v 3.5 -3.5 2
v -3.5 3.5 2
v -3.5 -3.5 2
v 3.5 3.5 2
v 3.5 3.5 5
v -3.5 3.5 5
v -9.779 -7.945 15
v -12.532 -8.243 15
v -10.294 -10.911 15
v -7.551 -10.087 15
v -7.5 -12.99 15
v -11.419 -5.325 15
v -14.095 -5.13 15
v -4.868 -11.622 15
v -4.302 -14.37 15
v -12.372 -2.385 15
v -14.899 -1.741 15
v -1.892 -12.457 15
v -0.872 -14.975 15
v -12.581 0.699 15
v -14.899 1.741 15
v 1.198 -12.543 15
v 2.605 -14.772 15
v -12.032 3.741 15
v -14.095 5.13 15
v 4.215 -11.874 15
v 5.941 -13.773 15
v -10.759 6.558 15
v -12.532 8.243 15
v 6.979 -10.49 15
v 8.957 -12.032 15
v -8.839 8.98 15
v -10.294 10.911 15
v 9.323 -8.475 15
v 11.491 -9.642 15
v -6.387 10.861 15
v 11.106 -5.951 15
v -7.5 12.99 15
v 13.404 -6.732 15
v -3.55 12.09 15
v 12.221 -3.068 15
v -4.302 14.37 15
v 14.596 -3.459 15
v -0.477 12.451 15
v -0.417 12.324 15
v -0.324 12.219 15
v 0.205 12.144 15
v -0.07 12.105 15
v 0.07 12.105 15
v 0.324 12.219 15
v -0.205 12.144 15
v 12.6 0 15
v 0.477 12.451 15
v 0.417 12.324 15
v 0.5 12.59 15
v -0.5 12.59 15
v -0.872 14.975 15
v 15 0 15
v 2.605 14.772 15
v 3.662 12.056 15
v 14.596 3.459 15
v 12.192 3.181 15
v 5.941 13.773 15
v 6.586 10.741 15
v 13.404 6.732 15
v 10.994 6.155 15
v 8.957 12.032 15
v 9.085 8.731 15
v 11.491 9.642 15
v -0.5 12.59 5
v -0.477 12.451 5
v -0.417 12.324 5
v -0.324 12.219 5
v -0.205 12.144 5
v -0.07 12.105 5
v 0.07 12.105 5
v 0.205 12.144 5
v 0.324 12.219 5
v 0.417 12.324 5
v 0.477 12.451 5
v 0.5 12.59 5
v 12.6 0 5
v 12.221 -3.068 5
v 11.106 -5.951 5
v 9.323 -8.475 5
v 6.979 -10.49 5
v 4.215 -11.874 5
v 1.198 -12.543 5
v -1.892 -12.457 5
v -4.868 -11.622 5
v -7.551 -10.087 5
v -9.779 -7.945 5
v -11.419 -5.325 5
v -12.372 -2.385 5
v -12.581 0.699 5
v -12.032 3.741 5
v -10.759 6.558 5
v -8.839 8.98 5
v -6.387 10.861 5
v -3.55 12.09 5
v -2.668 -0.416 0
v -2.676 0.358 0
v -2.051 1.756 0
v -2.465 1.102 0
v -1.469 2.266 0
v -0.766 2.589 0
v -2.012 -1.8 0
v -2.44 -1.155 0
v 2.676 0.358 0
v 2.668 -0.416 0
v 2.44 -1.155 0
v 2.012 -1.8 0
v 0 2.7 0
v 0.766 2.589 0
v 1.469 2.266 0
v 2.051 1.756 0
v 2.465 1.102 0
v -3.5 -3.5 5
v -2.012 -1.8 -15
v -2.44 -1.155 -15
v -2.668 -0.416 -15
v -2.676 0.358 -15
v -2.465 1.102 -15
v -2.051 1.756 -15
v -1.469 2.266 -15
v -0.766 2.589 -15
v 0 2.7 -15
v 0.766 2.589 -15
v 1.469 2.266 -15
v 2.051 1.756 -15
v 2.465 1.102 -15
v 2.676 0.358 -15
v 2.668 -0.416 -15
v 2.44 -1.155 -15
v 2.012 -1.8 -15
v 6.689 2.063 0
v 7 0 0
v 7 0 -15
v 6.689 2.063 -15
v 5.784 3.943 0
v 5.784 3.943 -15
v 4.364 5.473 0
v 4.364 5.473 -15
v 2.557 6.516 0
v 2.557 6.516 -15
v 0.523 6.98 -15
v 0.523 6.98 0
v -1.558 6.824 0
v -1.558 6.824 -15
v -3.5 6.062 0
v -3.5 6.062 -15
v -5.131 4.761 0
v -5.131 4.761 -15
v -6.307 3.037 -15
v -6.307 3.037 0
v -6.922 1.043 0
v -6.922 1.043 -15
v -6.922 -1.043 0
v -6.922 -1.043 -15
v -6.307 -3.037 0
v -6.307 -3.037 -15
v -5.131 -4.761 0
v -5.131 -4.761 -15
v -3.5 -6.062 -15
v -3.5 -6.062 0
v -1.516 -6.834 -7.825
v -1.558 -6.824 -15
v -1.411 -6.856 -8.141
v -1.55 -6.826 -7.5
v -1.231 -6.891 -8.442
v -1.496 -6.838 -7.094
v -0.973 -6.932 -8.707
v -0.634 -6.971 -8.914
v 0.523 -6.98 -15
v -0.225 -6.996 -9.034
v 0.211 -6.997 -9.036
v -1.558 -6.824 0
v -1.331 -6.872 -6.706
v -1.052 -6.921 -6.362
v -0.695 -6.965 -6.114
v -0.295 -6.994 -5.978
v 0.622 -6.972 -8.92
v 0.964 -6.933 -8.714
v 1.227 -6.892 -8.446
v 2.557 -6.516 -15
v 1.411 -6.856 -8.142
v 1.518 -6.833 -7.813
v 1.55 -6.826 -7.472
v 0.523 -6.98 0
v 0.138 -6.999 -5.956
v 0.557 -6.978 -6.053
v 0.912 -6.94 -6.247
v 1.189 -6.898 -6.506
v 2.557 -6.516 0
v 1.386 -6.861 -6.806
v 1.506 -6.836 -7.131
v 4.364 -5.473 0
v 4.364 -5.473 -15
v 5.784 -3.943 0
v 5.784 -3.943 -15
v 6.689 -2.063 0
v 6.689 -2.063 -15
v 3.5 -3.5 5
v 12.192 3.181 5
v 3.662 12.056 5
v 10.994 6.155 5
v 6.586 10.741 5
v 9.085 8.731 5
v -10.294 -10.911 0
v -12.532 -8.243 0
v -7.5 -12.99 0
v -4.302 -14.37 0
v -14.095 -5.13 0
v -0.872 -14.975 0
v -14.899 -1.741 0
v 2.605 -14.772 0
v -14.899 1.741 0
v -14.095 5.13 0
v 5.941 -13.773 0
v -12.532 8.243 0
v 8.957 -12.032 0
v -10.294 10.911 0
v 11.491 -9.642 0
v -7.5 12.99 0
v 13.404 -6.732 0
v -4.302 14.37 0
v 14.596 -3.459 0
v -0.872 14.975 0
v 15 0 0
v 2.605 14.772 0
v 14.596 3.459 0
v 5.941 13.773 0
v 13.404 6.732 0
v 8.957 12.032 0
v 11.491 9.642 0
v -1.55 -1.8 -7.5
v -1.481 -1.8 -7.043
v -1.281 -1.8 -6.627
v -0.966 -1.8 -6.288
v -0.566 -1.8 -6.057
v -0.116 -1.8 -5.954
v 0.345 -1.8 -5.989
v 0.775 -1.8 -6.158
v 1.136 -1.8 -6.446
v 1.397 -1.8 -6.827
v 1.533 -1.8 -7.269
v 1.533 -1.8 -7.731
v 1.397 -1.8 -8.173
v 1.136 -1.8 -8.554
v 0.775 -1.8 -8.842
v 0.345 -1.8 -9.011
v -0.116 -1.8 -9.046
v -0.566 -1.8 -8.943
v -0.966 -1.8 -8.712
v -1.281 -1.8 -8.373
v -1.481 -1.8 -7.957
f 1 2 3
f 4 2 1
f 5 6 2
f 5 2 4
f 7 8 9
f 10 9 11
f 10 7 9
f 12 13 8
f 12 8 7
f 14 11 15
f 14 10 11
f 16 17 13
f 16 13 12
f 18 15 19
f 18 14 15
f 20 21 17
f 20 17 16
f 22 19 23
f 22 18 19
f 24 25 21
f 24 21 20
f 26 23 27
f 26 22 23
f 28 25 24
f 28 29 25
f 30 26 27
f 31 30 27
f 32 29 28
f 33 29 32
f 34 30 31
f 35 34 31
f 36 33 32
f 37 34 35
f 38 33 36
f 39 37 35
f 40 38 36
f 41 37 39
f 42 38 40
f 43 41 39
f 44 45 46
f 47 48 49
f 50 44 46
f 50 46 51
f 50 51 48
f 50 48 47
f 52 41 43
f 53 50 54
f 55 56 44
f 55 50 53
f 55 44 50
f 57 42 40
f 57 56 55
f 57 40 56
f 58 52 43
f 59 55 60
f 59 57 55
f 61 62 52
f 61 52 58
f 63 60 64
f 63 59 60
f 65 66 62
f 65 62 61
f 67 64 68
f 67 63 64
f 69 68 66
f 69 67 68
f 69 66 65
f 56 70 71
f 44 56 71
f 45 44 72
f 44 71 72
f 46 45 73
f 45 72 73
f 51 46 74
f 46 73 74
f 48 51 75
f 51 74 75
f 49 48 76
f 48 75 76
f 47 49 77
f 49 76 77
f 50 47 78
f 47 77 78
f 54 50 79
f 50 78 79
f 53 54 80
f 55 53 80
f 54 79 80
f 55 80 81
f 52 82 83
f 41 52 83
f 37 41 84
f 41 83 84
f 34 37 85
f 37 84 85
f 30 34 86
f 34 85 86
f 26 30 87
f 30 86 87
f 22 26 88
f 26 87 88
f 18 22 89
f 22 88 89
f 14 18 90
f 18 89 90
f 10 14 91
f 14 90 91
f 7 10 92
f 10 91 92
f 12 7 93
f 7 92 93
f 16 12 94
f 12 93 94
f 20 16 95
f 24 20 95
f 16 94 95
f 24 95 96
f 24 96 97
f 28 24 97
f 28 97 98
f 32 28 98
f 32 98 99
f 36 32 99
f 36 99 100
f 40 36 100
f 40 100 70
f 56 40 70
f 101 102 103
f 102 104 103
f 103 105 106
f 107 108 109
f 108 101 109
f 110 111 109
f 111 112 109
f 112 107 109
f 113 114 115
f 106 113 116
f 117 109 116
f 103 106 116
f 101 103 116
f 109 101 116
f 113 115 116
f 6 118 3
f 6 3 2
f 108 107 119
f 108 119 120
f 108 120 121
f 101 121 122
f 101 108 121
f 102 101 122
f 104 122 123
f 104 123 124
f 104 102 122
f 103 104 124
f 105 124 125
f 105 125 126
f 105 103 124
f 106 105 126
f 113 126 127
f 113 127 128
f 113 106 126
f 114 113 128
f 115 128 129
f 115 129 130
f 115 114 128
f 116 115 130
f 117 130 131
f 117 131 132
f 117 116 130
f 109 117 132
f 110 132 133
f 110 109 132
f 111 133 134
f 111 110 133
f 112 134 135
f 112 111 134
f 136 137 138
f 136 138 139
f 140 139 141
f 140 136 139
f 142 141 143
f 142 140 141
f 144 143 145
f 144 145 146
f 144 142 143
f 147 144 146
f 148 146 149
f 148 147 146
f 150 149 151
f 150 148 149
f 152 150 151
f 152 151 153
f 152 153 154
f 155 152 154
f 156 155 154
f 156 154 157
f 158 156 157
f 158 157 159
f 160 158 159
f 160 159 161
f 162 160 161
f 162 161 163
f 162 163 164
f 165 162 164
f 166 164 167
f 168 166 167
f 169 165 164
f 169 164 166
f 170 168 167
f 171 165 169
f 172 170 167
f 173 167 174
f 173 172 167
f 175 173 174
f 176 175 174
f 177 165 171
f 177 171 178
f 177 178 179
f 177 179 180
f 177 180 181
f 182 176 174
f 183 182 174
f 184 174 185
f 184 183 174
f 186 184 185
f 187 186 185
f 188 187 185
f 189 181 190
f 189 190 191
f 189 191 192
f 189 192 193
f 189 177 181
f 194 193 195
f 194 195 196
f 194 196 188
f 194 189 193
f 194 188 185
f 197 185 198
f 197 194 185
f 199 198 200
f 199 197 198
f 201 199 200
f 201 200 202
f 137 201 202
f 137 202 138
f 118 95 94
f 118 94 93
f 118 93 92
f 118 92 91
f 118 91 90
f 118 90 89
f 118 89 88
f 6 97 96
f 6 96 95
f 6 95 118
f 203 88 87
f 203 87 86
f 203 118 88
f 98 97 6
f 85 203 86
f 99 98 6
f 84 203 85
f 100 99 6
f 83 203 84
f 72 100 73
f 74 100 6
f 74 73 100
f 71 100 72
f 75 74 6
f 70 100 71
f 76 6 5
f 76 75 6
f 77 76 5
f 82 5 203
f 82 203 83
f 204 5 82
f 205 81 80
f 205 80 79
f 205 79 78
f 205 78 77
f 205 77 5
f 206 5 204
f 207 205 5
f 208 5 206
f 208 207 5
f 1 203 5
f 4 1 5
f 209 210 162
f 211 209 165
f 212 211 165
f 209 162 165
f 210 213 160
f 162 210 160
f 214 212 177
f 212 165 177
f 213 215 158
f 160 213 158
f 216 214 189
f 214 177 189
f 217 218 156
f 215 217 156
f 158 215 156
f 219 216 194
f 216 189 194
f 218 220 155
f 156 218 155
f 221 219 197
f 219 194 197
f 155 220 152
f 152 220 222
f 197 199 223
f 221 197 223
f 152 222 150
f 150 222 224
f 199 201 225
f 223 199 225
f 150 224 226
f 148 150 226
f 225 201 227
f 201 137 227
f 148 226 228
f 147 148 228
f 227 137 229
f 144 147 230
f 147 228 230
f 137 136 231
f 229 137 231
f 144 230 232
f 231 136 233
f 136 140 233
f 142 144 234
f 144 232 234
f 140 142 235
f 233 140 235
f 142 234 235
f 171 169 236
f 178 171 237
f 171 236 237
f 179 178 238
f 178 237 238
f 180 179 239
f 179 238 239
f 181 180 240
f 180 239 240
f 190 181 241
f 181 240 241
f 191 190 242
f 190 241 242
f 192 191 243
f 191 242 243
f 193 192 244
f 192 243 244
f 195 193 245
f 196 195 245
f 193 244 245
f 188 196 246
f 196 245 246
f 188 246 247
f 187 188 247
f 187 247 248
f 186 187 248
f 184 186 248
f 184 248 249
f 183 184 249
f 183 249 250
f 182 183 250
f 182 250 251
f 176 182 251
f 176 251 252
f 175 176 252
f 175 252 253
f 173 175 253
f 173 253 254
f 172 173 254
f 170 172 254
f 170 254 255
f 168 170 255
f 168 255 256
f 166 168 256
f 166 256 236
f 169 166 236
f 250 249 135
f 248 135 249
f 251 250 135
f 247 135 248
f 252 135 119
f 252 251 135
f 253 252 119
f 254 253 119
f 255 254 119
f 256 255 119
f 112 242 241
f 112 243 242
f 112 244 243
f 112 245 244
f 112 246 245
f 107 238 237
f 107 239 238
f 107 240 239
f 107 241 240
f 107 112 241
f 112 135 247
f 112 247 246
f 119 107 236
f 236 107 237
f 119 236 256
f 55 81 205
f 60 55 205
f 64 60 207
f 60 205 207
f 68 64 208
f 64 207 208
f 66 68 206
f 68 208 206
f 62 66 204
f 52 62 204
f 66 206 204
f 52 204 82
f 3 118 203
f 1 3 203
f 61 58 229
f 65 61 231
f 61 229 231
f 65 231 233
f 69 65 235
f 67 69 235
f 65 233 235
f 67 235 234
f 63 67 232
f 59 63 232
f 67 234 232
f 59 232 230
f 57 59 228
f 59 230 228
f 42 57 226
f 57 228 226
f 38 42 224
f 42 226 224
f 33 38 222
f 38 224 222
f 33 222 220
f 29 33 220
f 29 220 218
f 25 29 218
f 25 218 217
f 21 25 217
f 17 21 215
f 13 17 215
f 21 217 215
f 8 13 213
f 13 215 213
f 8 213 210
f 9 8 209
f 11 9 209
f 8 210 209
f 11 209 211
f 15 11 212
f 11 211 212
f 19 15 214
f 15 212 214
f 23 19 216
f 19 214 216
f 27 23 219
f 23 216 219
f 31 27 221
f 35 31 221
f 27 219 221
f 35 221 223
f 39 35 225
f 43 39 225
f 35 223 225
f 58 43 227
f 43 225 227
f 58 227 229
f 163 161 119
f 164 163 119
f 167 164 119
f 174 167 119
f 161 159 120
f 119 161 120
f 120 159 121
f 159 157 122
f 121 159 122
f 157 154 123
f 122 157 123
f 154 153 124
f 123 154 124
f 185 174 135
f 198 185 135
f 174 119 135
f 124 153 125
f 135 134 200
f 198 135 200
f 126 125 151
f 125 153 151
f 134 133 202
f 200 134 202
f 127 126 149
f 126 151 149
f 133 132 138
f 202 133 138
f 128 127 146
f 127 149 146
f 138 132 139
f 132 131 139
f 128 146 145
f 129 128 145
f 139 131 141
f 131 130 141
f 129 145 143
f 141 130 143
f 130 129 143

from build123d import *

# Parameters (mm, degrees)
F0_R     = 7
F1_DEPTH = 15
F2_DEPTH = 5
F0_R_2   = 15
F3_DEPTH = 15
F5_D     = 3.1
F5_DEPTH = 13.201
F6_DEPTH = 15
F7_W     = 7
F7_H     = 7
F8_DEPTH = 3


with BuildPart() as f1:
    # F0 (on Top) → F1 (new body)
    with BuildSketch(Plane.XY):
        Circle(F0_R)
        with BuildLine():
            Line((2.0124611797, -1.8), (-2.0124611797, -1.8))
            ThreePointArc((-2.0124611797, -1.8), (0, 2.7), (2.0124611797, -1.8))
        make_face(mode=Mode.SUBTRACT)
    extrude(amount=-F1_DEPTH)

    # F0 (on Top) → F2 (join)
    with BuildSketch(Plane.XY):
        with BuildLine():
            ThreePointArc((-0.4999015713, 12.5900793651), (-8.731014838, -9.0845682286), (12.6, 0))
            ThreePointArc((12.6, 0), (9.0845682286, 8.731014838), (0.4999015713, 12.5900793651))
            ThreePointArc((0.4999015713, 12.5900793651), (0, 12.1), (-0.4999015713, 12.5900793651))
        make_face()
        Circle(F0_R, mode=Mode.SUBTRACT)
        Circle(F0_R)
        with BuildLine():
            Line((2.0124611797, -1.8), (-2.0124611797, -1.8))
            ThreePointArc((-2.0124611797, -1.8), (0, 2.7), (2.0124611797, -1.8))
        make_face(mode=Mode.SUBTRACT)
        with BuildLine():
            ThreePointArc((2.0124611797, -1.8), (0, 2.7), (-2.0124611797, -1.8))
            Line((-2.0124611797, -1.8), (2.0124611797, -1.8))
        make_face()
    extrude(amount=F2_DEPTH)

    # F0 (on Top) → F3 (join)
    with BuildSketch(Plane.XY):
        Circle(F0_R_2)
        with BuildLine():
            ThreePointArc((0.4999015713, 12.5900793651), (9.0845682286, 8.731014838), (12.6, 0))
            ThreePointArc((12.6, 0), (-8.731014838, -9.0845682286), (-0.4999015713, 12.5900793651))
            ThreePointArc((-0.4999015713, 12.5900793651), (0, 12.6), (0.4999015713, 12.5900793651))
        make_face(mode=Mode.SUBTRACT)
    extrude(amount=F3_DEPTH)

    # F5 (through all, one way)
    with BuildSketch(Plane(origin=(0, -1.8, 0), x_dir=(-1, 0, 0), z_dir=(0, 1, 0))):
        with Locations((0, -7.5)):
            Circle(F5_D / 2)
    extrude(amount=-F5_DEPTH, mode=Mode.SUBTRACT)

    # F0 (on Top) → F6 (join)
    with BuildSketch(Plane.XY):
        with BuildLine():
            ThreePointArc((-0.4999015713, 12.5900793651), (0, 12.1), (0.4999015713, 12.5900793651))
            ThreePointArc((0.4999015713, 12.5900793651), (0, 12.6), (-0.4999015713, 12.5900793651))
        make_face()
    extrude(amount=F6_DEPTH)

    # F7 (on face) → F8 (cut)
    with BuildSketch(Plane.XY.offset(5)):
        Rectangle(F7_W, F7_H)
    extrude(amount=-F8_DEPTH, mode=Mode.SUBTRACT)


solid = f1.part
